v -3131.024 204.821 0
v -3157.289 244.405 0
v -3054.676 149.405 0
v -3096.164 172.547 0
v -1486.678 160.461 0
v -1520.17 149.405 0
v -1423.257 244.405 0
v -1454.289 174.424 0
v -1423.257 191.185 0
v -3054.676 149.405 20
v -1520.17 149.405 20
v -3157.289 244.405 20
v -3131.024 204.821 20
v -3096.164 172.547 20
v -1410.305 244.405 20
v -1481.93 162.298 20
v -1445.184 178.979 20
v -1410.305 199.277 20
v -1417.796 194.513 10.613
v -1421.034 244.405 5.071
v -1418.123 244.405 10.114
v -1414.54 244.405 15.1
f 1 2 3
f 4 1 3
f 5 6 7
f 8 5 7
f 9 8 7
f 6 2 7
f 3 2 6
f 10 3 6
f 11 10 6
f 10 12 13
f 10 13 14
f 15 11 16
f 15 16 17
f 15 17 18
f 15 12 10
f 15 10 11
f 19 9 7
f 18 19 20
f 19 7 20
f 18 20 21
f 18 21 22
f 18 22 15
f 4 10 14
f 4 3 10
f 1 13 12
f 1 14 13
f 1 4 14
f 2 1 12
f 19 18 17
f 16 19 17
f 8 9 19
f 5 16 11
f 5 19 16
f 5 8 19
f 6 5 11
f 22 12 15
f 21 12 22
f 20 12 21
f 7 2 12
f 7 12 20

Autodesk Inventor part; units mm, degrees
ref_plane "YZ Plane" through (0, 0, 0) normal (1, 0, 0) x (0, 1, 0)
ref_plane "XZ Plane" through (0, 0, 0) normal (0, 1, 0) x (-1, 0, 0)
ref_plane "XY Plane" through (0, 0, 0) normal (0, 0, 1) x (1, 0, 0)
sketch "Skizze1" plane through (0, 0, 0) normal (0, 0, 1) x (1, 0, 0)
  line L0 (-3157.2887, 244.4054) -> (-1410.3053, 244.4054)
  line L1 (-1410.3053, 199.2768) -> (-1410.3053, 244.4054)
  arc A0 (-1520.1704, 149.4054) -> (-1410.3053, 199.2768) centre (-1628.683, 534.4054) ccw
  line L2 (-3054.6765, 149.4054) -> (-1520.1704, 149.4054)
  arc A1 (-3157.2887, 244.4054) -> (-3054.6765, 149.4054) centre (-2978.683, 334.4054) ccw
  point P0 (-2370.1189, 0)
  point P1 (-1410.3053, 199.2768)
  point P2 (-1410.3053, 244.4054)
  dimension "d59" = 400
  dimension "d60" = 200
  dimension "d61" = 95
  dimension "d62" = 0
  dimension "d63" = 0
  dimension "d64" = 45.1286
  dimension "d65" = 0
  dimension "d66" = 45.1286
  dimension "d67" = 109.865
  dimension "d68" = 109.865
  dimension "d69" = 95
  dimension "d70" = 959.8136
  dimension "d71" = 244.4054
  dimension "d72" = 1568.3777
  dimension "d73" = 90
  dimension "d74" = 1644.3711
  dimension "d75" = 1644.3711
  dimension "d76" = 1746.9834
  dimension "d77" = 1746.9834
extrude "Extrusion1" add sketch "Skizze1" along normal blind 20
sketch "Skizze2" plane through (-3157.2887, 244.4054, 0) normal (0, 1, 0) x (1, 0, 0)
  line L0 (1746.9834, -20) -> (1856.261, -20)
  ellipse E0 centre (1857.974, 0) end of major axis (1731.8988, 18.1709) minor radius 65.6716 (1734.0318, 0) -> (1746.9834, -20) ccw
  line L1 (1746.9834, 0) -> (0, 0) projected
  line L2 (1746.9834, 0) -> (1746.9834, -20) projected
  line L3 (1856.261, -20) -> (1856.261, 0)
  line L4 (1856.261, 0) -> (1734.0318, 0)
  line L5 (1637.1184, 0) -> (1746.9834, 0) projected
  point P0 (3157.2887, 0)
  point P1 (1734.0318, 0)
  dimension "d59" = 400
  dimension "d87" = 0
  dimension "d88" = 109.2776
extrude "Extrusion2" cut sketch "Skizze2" against normal through all
properties part number "HolzLatteRechts"
